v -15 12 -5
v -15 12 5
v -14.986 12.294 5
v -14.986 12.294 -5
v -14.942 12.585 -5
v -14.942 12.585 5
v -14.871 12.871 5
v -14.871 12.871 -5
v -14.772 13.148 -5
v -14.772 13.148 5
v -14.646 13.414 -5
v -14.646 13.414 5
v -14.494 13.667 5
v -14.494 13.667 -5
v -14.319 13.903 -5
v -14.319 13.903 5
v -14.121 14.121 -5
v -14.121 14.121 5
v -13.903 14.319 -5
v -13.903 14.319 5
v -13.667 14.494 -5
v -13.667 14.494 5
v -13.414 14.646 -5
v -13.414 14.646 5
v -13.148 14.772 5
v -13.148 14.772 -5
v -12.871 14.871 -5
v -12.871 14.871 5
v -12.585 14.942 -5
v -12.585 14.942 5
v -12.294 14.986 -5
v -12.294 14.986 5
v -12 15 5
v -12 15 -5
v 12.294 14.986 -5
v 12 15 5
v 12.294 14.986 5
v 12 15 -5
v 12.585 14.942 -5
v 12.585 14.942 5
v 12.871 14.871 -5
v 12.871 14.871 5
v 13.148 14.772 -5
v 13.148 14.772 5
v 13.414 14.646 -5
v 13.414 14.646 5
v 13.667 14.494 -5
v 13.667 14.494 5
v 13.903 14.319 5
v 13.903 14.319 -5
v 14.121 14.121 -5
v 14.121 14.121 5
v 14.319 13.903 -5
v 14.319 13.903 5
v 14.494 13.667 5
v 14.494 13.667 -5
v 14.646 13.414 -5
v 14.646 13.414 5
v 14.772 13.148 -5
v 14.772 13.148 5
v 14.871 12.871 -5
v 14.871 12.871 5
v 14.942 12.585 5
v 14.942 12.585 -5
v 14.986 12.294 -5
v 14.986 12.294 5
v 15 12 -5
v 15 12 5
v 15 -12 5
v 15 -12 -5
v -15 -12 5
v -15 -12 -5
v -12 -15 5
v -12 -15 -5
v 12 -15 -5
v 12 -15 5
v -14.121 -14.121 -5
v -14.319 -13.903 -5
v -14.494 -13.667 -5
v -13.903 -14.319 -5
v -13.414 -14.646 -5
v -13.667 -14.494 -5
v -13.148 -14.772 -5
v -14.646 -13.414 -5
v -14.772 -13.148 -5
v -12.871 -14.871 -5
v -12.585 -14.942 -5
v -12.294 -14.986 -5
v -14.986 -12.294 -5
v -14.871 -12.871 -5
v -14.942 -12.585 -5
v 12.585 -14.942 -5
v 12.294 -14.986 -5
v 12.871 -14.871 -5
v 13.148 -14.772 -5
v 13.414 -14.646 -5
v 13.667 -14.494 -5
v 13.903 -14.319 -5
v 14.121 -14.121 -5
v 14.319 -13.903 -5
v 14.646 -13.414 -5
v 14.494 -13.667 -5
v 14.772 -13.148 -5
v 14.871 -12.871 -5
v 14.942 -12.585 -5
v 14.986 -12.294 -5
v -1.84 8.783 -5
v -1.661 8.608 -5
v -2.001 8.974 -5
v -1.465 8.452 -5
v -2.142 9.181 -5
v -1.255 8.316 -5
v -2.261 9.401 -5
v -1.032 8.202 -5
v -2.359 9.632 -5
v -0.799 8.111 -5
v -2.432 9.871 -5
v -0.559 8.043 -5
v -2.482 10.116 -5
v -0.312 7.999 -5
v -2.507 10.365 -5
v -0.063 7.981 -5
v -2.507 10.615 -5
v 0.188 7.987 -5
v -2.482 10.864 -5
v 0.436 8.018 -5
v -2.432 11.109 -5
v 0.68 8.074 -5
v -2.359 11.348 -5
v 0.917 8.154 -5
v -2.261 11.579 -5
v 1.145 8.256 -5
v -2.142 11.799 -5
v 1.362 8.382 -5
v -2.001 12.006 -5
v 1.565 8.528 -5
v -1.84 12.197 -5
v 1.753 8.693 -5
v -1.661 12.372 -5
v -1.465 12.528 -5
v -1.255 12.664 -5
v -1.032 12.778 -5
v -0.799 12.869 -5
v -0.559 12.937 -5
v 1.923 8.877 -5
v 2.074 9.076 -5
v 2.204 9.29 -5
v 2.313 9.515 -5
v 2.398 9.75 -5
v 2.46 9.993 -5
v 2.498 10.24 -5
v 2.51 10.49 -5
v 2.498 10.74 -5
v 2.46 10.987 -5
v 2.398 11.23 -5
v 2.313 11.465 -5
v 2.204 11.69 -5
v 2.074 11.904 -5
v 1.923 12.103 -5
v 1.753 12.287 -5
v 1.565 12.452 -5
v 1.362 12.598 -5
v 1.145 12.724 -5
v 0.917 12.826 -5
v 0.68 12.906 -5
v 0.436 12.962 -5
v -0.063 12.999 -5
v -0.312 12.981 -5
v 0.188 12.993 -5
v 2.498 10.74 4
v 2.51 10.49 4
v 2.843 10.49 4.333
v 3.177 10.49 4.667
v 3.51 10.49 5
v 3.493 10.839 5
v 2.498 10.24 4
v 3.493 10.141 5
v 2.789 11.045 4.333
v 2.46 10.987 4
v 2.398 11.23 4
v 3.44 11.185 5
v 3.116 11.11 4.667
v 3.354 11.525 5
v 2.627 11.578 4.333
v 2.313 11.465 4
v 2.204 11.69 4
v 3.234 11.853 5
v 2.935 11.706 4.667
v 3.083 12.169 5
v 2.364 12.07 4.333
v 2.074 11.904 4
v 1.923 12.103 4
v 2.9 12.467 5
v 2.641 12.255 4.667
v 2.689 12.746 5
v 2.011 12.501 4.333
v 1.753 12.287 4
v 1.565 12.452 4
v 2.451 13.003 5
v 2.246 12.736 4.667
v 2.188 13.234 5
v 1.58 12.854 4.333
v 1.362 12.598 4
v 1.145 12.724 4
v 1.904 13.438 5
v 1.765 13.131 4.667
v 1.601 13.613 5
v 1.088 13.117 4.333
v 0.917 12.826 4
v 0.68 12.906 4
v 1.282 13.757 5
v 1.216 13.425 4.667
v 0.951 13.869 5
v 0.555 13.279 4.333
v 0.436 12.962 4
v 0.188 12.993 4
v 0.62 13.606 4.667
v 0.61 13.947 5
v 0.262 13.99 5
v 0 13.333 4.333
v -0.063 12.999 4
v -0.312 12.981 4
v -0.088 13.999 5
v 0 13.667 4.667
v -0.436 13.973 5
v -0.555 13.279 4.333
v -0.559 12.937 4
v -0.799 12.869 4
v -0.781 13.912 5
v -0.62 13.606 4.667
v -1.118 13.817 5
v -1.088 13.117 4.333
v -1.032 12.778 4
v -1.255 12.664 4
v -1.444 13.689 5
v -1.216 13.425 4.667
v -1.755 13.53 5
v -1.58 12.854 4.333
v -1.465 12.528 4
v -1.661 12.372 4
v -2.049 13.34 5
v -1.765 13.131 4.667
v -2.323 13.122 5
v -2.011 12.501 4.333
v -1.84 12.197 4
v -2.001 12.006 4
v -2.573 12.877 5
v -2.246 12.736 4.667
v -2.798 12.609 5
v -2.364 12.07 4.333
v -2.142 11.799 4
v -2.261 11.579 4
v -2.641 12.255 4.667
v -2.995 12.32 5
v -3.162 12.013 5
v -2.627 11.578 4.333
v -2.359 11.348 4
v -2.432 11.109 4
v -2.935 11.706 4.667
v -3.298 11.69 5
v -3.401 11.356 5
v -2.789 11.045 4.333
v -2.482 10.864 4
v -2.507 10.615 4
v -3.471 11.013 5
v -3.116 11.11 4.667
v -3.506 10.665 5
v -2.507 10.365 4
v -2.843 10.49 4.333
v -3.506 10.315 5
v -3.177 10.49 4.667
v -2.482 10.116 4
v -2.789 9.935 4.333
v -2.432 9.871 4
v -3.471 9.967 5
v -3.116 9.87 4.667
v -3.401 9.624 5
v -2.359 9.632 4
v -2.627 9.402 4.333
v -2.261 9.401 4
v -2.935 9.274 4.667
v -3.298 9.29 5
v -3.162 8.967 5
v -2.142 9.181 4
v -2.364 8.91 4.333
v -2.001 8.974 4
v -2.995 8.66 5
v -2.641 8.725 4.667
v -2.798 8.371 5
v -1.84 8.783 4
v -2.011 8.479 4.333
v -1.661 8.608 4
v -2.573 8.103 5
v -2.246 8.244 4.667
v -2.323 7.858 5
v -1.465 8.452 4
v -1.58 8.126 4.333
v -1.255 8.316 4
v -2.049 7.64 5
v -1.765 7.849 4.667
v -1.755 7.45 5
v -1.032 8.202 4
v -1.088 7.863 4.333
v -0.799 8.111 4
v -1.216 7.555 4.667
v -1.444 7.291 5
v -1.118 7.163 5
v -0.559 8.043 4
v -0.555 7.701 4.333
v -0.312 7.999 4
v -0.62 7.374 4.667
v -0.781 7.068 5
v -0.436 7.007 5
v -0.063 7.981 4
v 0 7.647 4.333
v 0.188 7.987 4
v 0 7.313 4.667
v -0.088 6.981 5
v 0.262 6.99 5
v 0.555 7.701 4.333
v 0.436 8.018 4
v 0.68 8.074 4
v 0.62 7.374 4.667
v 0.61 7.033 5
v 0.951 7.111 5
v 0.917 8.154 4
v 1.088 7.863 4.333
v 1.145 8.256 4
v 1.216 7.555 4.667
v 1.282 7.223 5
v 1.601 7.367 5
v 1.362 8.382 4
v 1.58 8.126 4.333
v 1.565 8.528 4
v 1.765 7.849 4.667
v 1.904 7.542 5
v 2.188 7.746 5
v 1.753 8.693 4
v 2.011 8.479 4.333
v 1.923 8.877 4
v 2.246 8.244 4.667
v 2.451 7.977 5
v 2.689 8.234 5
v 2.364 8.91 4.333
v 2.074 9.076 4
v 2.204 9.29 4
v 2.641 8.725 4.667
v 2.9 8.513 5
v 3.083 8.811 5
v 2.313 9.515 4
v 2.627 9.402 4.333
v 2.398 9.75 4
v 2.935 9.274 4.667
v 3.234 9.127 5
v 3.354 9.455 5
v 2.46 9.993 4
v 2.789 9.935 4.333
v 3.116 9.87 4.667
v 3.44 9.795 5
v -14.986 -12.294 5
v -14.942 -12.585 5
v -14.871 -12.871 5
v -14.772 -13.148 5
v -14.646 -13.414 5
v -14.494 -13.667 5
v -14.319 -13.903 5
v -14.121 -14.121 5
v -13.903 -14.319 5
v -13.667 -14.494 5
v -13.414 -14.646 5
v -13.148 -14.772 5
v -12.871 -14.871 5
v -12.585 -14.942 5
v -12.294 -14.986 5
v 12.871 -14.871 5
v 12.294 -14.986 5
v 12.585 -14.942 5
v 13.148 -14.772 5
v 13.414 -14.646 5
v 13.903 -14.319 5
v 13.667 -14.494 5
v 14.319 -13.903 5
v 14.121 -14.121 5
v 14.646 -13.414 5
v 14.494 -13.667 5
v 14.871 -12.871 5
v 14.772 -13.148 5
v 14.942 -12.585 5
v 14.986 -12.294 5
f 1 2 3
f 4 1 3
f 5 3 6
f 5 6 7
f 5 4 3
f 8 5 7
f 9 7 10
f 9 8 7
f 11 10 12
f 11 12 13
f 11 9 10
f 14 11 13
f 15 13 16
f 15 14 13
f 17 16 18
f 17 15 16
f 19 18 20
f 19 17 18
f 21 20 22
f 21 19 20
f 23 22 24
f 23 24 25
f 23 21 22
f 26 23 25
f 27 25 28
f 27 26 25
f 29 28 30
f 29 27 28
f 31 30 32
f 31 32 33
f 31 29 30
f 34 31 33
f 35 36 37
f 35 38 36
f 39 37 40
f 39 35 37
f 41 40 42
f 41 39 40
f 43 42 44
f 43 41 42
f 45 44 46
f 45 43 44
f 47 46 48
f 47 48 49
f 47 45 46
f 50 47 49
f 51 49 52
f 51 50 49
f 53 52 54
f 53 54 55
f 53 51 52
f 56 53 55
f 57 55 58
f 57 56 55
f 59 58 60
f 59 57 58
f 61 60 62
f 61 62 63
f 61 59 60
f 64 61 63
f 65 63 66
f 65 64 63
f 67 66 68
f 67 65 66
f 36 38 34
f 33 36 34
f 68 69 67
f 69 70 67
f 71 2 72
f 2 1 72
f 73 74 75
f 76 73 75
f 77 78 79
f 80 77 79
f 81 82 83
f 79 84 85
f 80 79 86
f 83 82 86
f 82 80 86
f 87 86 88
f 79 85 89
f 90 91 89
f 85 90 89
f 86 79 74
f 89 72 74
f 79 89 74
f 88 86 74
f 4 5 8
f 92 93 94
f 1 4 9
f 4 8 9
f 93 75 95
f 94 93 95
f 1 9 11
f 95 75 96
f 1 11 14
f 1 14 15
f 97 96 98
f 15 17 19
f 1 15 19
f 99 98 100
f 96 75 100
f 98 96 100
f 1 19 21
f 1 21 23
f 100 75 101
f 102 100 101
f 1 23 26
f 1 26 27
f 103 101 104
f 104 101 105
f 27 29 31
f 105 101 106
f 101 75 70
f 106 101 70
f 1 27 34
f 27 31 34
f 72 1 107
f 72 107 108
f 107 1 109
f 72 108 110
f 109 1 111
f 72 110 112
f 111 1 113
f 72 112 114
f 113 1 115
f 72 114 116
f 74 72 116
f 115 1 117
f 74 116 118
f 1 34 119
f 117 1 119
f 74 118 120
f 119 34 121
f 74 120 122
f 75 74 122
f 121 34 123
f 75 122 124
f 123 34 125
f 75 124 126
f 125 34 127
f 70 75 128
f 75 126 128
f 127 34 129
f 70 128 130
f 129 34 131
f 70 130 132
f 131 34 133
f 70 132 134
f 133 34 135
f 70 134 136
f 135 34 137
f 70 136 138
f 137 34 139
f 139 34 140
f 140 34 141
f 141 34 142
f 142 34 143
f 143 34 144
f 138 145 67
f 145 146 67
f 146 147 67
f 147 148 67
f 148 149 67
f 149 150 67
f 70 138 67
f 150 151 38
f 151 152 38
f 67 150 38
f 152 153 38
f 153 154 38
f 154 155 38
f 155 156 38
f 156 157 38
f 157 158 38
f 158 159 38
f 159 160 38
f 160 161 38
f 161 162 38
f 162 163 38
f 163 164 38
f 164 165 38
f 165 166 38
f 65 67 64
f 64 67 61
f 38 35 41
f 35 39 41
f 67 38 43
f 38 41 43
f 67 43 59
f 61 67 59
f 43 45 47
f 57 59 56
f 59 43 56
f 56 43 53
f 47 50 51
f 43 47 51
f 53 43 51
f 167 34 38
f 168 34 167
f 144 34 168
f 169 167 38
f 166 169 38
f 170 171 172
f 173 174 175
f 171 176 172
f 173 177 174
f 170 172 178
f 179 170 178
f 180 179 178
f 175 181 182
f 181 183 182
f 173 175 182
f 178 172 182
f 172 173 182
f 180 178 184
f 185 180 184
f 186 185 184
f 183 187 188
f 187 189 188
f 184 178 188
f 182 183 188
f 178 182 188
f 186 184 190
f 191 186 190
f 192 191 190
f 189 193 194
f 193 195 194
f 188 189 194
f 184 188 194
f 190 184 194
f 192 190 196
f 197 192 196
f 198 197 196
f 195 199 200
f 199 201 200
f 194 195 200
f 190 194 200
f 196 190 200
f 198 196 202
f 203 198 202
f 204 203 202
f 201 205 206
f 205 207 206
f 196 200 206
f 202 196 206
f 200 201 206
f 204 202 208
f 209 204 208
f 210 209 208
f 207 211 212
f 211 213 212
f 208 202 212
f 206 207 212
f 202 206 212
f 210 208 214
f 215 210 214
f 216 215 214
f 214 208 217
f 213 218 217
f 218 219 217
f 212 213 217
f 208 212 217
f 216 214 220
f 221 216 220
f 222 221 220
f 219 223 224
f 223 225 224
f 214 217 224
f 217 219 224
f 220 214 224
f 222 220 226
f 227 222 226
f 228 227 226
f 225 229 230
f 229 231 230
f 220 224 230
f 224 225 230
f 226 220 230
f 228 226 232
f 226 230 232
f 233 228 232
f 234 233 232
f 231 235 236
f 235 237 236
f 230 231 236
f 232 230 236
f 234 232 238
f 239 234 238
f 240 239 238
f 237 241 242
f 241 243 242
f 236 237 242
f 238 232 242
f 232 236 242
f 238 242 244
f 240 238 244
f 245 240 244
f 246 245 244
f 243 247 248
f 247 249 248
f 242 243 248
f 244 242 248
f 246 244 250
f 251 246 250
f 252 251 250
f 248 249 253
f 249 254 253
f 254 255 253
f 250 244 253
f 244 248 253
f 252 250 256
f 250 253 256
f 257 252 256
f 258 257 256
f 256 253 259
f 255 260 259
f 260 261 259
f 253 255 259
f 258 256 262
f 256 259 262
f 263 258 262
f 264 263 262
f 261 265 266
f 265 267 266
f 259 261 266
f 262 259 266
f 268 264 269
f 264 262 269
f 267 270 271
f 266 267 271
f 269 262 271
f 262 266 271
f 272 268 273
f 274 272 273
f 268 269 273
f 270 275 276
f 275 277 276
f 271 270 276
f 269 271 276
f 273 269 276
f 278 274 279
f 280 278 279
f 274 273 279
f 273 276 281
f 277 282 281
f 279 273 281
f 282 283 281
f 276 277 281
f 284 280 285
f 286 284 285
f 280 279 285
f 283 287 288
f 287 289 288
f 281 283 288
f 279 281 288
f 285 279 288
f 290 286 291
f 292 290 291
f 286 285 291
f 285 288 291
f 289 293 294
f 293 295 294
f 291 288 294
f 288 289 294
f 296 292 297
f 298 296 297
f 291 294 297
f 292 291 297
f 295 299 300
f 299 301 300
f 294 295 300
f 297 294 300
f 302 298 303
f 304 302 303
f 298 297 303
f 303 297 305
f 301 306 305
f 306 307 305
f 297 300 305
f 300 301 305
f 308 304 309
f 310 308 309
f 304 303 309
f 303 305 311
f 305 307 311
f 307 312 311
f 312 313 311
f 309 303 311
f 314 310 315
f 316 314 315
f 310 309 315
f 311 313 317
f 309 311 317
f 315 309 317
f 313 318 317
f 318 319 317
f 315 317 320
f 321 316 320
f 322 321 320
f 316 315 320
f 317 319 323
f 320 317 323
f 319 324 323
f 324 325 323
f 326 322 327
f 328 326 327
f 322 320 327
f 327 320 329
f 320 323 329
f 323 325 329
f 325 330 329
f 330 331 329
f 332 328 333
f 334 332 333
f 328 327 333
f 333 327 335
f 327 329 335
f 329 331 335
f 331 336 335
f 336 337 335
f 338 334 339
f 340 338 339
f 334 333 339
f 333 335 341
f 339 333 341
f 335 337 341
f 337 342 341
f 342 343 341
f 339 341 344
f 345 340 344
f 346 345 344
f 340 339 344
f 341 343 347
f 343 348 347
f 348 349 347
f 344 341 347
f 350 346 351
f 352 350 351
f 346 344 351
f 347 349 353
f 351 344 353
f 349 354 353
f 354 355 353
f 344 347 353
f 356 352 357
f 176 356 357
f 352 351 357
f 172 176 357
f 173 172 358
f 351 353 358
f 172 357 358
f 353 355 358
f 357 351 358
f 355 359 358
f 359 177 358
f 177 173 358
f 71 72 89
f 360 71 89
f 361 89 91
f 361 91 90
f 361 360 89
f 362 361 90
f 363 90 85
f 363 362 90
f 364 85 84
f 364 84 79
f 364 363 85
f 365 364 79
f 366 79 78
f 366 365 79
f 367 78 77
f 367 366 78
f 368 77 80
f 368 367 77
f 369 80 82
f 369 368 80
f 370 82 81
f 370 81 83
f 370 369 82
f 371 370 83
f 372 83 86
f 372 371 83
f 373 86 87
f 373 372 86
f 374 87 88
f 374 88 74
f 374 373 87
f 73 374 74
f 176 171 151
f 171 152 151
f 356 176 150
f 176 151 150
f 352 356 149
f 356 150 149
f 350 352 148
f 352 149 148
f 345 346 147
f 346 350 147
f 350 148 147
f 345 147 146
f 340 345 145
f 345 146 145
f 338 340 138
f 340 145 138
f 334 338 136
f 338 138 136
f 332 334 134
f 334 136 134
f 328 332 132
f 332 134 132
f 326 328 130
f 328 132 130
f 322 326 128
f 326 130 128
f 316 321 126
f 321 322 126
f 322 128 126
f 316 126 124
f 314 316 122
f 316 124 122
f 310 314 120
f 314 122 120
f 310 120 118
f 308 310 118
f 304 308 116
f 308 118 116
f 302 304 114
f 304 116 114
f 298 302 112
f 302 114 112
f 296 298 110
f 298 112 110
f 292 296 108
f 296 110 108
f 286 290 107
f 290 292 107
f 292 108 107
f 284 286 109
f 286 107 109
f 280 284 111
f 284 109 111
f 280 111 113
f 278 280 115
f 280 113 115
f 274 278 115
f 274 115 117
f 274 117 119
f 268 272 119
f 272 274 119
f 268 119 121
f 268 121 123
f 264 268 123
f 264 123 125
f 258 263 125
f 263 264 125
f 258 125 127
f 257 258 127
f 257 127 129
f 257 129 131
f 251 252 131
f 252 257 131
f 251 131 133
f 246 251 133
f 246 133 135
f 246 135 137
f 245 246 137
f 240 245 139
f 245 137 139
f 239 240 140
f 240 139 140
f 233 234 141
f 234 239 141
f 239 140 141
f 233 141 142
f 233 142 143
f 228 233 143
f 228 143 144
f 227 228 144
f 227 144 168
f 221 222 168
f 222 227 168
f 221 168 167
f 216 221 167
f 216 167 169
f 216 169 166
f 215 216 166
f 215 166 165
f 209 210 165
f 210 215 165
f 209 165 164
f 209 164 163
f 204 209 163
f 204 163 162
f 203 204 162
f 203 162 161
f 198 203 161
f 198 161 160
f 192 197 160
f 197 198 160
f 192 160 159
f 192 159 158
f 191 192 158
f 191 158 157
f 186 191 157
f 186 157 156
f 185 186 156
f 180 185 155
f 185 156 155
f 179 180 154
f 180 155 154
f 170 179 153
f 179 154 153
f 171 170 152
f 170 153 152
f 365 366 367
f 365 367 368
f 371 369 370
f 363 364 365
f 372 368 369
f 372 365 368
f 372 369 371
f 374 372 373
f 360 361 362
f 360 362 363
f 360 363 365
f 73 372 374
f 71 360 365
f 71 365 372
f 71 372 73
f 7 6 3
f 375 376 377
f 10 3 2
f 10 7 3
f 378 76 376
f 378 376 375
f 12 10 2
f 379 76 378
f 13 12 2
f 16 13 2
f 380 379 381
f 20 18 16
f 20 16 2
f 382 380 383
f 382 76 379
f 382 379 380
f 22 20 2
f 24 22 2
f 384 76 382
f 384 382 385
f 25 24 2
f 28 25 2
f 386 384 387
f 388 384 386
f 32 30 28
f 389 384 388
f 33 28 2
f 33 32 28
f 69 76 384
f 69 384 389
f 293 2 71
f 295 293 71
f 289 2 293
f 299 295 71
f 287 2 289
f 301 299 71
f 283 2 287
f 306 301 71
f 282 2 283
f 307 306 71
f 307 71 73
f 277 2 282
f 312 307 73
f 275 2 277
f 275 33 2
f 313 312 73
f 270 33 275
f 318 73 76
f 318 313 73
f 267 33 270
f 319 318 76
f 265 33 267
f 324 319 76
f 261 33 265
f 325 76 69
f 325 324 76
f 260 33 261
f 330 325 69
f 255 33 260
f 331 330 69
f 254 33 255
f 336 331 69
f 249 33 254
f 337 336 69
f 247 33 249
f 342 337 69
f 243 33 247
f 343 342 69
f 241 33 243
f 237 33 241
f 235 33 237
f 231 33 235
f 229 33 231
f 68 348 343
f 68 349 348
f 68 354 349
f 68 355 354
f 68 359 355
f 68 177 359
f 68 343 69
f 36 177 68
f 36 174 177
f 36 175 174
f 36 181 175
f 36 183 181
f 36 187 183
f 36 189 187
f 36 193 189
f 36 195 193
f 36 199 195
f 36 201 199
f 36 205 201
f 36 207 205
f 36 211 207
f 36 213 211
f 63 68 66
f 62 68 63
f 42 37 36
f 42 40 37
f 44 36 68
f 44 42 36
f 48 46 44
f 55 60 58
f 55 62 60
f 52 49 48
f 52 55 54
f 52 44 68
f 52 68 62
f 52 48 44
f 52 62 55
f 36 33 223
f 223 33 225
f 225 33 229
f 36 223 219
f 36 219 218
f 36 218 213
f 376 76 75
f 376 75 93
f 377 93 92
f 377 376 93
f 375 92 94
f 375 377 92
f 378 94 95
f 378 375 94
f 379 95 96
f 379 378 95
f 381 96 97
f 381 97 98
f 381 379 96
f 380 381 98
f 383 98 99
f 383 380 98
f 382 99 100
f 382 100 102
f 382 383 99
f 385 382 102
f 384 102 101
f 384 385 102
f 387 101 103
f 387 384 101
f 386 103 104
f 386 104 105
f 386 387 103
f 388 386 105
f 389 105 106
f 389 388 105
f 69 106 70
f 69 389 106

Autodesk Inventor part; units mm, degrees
sketch "Esboço1" plane through (0, 0, 0) normal (0, 0, 1) x (1, 0, 0)
  line L0 (-15, -15) -> (15, -15)
  line L1 (15, -15) -> (15, 15)
  line L2 (15, 15) -> (-15, 15)
  line L3 (-15, 15) -> (-15, -15)
  line L4 (-15, -15) -> (15, 15) construction
  line L5 (15, -15) -> (-15, 15) construction
  circle A0 centre (0, 10.49) radius 2.51
  point P0 (0, 0)
  dimension "d0" = 30
  dimension "d4" = 5.02
  dimension "d5" = 2
extrude "Extrusão1" add sketch "Esboço1" along normal mid plane 10
fillet "Arredondamento1" radius 3 4 edges at (-15, 15, 0) (15, 15, 0) (15, -15, 0) (-15, -15, 0)
chamfer "Chanfro1" distance 1 angle 45 1 edges at (-2.51, 10.49, 5)
properties part number "Sessao8_07_04_2025_0004_0001" material "Ouro"
